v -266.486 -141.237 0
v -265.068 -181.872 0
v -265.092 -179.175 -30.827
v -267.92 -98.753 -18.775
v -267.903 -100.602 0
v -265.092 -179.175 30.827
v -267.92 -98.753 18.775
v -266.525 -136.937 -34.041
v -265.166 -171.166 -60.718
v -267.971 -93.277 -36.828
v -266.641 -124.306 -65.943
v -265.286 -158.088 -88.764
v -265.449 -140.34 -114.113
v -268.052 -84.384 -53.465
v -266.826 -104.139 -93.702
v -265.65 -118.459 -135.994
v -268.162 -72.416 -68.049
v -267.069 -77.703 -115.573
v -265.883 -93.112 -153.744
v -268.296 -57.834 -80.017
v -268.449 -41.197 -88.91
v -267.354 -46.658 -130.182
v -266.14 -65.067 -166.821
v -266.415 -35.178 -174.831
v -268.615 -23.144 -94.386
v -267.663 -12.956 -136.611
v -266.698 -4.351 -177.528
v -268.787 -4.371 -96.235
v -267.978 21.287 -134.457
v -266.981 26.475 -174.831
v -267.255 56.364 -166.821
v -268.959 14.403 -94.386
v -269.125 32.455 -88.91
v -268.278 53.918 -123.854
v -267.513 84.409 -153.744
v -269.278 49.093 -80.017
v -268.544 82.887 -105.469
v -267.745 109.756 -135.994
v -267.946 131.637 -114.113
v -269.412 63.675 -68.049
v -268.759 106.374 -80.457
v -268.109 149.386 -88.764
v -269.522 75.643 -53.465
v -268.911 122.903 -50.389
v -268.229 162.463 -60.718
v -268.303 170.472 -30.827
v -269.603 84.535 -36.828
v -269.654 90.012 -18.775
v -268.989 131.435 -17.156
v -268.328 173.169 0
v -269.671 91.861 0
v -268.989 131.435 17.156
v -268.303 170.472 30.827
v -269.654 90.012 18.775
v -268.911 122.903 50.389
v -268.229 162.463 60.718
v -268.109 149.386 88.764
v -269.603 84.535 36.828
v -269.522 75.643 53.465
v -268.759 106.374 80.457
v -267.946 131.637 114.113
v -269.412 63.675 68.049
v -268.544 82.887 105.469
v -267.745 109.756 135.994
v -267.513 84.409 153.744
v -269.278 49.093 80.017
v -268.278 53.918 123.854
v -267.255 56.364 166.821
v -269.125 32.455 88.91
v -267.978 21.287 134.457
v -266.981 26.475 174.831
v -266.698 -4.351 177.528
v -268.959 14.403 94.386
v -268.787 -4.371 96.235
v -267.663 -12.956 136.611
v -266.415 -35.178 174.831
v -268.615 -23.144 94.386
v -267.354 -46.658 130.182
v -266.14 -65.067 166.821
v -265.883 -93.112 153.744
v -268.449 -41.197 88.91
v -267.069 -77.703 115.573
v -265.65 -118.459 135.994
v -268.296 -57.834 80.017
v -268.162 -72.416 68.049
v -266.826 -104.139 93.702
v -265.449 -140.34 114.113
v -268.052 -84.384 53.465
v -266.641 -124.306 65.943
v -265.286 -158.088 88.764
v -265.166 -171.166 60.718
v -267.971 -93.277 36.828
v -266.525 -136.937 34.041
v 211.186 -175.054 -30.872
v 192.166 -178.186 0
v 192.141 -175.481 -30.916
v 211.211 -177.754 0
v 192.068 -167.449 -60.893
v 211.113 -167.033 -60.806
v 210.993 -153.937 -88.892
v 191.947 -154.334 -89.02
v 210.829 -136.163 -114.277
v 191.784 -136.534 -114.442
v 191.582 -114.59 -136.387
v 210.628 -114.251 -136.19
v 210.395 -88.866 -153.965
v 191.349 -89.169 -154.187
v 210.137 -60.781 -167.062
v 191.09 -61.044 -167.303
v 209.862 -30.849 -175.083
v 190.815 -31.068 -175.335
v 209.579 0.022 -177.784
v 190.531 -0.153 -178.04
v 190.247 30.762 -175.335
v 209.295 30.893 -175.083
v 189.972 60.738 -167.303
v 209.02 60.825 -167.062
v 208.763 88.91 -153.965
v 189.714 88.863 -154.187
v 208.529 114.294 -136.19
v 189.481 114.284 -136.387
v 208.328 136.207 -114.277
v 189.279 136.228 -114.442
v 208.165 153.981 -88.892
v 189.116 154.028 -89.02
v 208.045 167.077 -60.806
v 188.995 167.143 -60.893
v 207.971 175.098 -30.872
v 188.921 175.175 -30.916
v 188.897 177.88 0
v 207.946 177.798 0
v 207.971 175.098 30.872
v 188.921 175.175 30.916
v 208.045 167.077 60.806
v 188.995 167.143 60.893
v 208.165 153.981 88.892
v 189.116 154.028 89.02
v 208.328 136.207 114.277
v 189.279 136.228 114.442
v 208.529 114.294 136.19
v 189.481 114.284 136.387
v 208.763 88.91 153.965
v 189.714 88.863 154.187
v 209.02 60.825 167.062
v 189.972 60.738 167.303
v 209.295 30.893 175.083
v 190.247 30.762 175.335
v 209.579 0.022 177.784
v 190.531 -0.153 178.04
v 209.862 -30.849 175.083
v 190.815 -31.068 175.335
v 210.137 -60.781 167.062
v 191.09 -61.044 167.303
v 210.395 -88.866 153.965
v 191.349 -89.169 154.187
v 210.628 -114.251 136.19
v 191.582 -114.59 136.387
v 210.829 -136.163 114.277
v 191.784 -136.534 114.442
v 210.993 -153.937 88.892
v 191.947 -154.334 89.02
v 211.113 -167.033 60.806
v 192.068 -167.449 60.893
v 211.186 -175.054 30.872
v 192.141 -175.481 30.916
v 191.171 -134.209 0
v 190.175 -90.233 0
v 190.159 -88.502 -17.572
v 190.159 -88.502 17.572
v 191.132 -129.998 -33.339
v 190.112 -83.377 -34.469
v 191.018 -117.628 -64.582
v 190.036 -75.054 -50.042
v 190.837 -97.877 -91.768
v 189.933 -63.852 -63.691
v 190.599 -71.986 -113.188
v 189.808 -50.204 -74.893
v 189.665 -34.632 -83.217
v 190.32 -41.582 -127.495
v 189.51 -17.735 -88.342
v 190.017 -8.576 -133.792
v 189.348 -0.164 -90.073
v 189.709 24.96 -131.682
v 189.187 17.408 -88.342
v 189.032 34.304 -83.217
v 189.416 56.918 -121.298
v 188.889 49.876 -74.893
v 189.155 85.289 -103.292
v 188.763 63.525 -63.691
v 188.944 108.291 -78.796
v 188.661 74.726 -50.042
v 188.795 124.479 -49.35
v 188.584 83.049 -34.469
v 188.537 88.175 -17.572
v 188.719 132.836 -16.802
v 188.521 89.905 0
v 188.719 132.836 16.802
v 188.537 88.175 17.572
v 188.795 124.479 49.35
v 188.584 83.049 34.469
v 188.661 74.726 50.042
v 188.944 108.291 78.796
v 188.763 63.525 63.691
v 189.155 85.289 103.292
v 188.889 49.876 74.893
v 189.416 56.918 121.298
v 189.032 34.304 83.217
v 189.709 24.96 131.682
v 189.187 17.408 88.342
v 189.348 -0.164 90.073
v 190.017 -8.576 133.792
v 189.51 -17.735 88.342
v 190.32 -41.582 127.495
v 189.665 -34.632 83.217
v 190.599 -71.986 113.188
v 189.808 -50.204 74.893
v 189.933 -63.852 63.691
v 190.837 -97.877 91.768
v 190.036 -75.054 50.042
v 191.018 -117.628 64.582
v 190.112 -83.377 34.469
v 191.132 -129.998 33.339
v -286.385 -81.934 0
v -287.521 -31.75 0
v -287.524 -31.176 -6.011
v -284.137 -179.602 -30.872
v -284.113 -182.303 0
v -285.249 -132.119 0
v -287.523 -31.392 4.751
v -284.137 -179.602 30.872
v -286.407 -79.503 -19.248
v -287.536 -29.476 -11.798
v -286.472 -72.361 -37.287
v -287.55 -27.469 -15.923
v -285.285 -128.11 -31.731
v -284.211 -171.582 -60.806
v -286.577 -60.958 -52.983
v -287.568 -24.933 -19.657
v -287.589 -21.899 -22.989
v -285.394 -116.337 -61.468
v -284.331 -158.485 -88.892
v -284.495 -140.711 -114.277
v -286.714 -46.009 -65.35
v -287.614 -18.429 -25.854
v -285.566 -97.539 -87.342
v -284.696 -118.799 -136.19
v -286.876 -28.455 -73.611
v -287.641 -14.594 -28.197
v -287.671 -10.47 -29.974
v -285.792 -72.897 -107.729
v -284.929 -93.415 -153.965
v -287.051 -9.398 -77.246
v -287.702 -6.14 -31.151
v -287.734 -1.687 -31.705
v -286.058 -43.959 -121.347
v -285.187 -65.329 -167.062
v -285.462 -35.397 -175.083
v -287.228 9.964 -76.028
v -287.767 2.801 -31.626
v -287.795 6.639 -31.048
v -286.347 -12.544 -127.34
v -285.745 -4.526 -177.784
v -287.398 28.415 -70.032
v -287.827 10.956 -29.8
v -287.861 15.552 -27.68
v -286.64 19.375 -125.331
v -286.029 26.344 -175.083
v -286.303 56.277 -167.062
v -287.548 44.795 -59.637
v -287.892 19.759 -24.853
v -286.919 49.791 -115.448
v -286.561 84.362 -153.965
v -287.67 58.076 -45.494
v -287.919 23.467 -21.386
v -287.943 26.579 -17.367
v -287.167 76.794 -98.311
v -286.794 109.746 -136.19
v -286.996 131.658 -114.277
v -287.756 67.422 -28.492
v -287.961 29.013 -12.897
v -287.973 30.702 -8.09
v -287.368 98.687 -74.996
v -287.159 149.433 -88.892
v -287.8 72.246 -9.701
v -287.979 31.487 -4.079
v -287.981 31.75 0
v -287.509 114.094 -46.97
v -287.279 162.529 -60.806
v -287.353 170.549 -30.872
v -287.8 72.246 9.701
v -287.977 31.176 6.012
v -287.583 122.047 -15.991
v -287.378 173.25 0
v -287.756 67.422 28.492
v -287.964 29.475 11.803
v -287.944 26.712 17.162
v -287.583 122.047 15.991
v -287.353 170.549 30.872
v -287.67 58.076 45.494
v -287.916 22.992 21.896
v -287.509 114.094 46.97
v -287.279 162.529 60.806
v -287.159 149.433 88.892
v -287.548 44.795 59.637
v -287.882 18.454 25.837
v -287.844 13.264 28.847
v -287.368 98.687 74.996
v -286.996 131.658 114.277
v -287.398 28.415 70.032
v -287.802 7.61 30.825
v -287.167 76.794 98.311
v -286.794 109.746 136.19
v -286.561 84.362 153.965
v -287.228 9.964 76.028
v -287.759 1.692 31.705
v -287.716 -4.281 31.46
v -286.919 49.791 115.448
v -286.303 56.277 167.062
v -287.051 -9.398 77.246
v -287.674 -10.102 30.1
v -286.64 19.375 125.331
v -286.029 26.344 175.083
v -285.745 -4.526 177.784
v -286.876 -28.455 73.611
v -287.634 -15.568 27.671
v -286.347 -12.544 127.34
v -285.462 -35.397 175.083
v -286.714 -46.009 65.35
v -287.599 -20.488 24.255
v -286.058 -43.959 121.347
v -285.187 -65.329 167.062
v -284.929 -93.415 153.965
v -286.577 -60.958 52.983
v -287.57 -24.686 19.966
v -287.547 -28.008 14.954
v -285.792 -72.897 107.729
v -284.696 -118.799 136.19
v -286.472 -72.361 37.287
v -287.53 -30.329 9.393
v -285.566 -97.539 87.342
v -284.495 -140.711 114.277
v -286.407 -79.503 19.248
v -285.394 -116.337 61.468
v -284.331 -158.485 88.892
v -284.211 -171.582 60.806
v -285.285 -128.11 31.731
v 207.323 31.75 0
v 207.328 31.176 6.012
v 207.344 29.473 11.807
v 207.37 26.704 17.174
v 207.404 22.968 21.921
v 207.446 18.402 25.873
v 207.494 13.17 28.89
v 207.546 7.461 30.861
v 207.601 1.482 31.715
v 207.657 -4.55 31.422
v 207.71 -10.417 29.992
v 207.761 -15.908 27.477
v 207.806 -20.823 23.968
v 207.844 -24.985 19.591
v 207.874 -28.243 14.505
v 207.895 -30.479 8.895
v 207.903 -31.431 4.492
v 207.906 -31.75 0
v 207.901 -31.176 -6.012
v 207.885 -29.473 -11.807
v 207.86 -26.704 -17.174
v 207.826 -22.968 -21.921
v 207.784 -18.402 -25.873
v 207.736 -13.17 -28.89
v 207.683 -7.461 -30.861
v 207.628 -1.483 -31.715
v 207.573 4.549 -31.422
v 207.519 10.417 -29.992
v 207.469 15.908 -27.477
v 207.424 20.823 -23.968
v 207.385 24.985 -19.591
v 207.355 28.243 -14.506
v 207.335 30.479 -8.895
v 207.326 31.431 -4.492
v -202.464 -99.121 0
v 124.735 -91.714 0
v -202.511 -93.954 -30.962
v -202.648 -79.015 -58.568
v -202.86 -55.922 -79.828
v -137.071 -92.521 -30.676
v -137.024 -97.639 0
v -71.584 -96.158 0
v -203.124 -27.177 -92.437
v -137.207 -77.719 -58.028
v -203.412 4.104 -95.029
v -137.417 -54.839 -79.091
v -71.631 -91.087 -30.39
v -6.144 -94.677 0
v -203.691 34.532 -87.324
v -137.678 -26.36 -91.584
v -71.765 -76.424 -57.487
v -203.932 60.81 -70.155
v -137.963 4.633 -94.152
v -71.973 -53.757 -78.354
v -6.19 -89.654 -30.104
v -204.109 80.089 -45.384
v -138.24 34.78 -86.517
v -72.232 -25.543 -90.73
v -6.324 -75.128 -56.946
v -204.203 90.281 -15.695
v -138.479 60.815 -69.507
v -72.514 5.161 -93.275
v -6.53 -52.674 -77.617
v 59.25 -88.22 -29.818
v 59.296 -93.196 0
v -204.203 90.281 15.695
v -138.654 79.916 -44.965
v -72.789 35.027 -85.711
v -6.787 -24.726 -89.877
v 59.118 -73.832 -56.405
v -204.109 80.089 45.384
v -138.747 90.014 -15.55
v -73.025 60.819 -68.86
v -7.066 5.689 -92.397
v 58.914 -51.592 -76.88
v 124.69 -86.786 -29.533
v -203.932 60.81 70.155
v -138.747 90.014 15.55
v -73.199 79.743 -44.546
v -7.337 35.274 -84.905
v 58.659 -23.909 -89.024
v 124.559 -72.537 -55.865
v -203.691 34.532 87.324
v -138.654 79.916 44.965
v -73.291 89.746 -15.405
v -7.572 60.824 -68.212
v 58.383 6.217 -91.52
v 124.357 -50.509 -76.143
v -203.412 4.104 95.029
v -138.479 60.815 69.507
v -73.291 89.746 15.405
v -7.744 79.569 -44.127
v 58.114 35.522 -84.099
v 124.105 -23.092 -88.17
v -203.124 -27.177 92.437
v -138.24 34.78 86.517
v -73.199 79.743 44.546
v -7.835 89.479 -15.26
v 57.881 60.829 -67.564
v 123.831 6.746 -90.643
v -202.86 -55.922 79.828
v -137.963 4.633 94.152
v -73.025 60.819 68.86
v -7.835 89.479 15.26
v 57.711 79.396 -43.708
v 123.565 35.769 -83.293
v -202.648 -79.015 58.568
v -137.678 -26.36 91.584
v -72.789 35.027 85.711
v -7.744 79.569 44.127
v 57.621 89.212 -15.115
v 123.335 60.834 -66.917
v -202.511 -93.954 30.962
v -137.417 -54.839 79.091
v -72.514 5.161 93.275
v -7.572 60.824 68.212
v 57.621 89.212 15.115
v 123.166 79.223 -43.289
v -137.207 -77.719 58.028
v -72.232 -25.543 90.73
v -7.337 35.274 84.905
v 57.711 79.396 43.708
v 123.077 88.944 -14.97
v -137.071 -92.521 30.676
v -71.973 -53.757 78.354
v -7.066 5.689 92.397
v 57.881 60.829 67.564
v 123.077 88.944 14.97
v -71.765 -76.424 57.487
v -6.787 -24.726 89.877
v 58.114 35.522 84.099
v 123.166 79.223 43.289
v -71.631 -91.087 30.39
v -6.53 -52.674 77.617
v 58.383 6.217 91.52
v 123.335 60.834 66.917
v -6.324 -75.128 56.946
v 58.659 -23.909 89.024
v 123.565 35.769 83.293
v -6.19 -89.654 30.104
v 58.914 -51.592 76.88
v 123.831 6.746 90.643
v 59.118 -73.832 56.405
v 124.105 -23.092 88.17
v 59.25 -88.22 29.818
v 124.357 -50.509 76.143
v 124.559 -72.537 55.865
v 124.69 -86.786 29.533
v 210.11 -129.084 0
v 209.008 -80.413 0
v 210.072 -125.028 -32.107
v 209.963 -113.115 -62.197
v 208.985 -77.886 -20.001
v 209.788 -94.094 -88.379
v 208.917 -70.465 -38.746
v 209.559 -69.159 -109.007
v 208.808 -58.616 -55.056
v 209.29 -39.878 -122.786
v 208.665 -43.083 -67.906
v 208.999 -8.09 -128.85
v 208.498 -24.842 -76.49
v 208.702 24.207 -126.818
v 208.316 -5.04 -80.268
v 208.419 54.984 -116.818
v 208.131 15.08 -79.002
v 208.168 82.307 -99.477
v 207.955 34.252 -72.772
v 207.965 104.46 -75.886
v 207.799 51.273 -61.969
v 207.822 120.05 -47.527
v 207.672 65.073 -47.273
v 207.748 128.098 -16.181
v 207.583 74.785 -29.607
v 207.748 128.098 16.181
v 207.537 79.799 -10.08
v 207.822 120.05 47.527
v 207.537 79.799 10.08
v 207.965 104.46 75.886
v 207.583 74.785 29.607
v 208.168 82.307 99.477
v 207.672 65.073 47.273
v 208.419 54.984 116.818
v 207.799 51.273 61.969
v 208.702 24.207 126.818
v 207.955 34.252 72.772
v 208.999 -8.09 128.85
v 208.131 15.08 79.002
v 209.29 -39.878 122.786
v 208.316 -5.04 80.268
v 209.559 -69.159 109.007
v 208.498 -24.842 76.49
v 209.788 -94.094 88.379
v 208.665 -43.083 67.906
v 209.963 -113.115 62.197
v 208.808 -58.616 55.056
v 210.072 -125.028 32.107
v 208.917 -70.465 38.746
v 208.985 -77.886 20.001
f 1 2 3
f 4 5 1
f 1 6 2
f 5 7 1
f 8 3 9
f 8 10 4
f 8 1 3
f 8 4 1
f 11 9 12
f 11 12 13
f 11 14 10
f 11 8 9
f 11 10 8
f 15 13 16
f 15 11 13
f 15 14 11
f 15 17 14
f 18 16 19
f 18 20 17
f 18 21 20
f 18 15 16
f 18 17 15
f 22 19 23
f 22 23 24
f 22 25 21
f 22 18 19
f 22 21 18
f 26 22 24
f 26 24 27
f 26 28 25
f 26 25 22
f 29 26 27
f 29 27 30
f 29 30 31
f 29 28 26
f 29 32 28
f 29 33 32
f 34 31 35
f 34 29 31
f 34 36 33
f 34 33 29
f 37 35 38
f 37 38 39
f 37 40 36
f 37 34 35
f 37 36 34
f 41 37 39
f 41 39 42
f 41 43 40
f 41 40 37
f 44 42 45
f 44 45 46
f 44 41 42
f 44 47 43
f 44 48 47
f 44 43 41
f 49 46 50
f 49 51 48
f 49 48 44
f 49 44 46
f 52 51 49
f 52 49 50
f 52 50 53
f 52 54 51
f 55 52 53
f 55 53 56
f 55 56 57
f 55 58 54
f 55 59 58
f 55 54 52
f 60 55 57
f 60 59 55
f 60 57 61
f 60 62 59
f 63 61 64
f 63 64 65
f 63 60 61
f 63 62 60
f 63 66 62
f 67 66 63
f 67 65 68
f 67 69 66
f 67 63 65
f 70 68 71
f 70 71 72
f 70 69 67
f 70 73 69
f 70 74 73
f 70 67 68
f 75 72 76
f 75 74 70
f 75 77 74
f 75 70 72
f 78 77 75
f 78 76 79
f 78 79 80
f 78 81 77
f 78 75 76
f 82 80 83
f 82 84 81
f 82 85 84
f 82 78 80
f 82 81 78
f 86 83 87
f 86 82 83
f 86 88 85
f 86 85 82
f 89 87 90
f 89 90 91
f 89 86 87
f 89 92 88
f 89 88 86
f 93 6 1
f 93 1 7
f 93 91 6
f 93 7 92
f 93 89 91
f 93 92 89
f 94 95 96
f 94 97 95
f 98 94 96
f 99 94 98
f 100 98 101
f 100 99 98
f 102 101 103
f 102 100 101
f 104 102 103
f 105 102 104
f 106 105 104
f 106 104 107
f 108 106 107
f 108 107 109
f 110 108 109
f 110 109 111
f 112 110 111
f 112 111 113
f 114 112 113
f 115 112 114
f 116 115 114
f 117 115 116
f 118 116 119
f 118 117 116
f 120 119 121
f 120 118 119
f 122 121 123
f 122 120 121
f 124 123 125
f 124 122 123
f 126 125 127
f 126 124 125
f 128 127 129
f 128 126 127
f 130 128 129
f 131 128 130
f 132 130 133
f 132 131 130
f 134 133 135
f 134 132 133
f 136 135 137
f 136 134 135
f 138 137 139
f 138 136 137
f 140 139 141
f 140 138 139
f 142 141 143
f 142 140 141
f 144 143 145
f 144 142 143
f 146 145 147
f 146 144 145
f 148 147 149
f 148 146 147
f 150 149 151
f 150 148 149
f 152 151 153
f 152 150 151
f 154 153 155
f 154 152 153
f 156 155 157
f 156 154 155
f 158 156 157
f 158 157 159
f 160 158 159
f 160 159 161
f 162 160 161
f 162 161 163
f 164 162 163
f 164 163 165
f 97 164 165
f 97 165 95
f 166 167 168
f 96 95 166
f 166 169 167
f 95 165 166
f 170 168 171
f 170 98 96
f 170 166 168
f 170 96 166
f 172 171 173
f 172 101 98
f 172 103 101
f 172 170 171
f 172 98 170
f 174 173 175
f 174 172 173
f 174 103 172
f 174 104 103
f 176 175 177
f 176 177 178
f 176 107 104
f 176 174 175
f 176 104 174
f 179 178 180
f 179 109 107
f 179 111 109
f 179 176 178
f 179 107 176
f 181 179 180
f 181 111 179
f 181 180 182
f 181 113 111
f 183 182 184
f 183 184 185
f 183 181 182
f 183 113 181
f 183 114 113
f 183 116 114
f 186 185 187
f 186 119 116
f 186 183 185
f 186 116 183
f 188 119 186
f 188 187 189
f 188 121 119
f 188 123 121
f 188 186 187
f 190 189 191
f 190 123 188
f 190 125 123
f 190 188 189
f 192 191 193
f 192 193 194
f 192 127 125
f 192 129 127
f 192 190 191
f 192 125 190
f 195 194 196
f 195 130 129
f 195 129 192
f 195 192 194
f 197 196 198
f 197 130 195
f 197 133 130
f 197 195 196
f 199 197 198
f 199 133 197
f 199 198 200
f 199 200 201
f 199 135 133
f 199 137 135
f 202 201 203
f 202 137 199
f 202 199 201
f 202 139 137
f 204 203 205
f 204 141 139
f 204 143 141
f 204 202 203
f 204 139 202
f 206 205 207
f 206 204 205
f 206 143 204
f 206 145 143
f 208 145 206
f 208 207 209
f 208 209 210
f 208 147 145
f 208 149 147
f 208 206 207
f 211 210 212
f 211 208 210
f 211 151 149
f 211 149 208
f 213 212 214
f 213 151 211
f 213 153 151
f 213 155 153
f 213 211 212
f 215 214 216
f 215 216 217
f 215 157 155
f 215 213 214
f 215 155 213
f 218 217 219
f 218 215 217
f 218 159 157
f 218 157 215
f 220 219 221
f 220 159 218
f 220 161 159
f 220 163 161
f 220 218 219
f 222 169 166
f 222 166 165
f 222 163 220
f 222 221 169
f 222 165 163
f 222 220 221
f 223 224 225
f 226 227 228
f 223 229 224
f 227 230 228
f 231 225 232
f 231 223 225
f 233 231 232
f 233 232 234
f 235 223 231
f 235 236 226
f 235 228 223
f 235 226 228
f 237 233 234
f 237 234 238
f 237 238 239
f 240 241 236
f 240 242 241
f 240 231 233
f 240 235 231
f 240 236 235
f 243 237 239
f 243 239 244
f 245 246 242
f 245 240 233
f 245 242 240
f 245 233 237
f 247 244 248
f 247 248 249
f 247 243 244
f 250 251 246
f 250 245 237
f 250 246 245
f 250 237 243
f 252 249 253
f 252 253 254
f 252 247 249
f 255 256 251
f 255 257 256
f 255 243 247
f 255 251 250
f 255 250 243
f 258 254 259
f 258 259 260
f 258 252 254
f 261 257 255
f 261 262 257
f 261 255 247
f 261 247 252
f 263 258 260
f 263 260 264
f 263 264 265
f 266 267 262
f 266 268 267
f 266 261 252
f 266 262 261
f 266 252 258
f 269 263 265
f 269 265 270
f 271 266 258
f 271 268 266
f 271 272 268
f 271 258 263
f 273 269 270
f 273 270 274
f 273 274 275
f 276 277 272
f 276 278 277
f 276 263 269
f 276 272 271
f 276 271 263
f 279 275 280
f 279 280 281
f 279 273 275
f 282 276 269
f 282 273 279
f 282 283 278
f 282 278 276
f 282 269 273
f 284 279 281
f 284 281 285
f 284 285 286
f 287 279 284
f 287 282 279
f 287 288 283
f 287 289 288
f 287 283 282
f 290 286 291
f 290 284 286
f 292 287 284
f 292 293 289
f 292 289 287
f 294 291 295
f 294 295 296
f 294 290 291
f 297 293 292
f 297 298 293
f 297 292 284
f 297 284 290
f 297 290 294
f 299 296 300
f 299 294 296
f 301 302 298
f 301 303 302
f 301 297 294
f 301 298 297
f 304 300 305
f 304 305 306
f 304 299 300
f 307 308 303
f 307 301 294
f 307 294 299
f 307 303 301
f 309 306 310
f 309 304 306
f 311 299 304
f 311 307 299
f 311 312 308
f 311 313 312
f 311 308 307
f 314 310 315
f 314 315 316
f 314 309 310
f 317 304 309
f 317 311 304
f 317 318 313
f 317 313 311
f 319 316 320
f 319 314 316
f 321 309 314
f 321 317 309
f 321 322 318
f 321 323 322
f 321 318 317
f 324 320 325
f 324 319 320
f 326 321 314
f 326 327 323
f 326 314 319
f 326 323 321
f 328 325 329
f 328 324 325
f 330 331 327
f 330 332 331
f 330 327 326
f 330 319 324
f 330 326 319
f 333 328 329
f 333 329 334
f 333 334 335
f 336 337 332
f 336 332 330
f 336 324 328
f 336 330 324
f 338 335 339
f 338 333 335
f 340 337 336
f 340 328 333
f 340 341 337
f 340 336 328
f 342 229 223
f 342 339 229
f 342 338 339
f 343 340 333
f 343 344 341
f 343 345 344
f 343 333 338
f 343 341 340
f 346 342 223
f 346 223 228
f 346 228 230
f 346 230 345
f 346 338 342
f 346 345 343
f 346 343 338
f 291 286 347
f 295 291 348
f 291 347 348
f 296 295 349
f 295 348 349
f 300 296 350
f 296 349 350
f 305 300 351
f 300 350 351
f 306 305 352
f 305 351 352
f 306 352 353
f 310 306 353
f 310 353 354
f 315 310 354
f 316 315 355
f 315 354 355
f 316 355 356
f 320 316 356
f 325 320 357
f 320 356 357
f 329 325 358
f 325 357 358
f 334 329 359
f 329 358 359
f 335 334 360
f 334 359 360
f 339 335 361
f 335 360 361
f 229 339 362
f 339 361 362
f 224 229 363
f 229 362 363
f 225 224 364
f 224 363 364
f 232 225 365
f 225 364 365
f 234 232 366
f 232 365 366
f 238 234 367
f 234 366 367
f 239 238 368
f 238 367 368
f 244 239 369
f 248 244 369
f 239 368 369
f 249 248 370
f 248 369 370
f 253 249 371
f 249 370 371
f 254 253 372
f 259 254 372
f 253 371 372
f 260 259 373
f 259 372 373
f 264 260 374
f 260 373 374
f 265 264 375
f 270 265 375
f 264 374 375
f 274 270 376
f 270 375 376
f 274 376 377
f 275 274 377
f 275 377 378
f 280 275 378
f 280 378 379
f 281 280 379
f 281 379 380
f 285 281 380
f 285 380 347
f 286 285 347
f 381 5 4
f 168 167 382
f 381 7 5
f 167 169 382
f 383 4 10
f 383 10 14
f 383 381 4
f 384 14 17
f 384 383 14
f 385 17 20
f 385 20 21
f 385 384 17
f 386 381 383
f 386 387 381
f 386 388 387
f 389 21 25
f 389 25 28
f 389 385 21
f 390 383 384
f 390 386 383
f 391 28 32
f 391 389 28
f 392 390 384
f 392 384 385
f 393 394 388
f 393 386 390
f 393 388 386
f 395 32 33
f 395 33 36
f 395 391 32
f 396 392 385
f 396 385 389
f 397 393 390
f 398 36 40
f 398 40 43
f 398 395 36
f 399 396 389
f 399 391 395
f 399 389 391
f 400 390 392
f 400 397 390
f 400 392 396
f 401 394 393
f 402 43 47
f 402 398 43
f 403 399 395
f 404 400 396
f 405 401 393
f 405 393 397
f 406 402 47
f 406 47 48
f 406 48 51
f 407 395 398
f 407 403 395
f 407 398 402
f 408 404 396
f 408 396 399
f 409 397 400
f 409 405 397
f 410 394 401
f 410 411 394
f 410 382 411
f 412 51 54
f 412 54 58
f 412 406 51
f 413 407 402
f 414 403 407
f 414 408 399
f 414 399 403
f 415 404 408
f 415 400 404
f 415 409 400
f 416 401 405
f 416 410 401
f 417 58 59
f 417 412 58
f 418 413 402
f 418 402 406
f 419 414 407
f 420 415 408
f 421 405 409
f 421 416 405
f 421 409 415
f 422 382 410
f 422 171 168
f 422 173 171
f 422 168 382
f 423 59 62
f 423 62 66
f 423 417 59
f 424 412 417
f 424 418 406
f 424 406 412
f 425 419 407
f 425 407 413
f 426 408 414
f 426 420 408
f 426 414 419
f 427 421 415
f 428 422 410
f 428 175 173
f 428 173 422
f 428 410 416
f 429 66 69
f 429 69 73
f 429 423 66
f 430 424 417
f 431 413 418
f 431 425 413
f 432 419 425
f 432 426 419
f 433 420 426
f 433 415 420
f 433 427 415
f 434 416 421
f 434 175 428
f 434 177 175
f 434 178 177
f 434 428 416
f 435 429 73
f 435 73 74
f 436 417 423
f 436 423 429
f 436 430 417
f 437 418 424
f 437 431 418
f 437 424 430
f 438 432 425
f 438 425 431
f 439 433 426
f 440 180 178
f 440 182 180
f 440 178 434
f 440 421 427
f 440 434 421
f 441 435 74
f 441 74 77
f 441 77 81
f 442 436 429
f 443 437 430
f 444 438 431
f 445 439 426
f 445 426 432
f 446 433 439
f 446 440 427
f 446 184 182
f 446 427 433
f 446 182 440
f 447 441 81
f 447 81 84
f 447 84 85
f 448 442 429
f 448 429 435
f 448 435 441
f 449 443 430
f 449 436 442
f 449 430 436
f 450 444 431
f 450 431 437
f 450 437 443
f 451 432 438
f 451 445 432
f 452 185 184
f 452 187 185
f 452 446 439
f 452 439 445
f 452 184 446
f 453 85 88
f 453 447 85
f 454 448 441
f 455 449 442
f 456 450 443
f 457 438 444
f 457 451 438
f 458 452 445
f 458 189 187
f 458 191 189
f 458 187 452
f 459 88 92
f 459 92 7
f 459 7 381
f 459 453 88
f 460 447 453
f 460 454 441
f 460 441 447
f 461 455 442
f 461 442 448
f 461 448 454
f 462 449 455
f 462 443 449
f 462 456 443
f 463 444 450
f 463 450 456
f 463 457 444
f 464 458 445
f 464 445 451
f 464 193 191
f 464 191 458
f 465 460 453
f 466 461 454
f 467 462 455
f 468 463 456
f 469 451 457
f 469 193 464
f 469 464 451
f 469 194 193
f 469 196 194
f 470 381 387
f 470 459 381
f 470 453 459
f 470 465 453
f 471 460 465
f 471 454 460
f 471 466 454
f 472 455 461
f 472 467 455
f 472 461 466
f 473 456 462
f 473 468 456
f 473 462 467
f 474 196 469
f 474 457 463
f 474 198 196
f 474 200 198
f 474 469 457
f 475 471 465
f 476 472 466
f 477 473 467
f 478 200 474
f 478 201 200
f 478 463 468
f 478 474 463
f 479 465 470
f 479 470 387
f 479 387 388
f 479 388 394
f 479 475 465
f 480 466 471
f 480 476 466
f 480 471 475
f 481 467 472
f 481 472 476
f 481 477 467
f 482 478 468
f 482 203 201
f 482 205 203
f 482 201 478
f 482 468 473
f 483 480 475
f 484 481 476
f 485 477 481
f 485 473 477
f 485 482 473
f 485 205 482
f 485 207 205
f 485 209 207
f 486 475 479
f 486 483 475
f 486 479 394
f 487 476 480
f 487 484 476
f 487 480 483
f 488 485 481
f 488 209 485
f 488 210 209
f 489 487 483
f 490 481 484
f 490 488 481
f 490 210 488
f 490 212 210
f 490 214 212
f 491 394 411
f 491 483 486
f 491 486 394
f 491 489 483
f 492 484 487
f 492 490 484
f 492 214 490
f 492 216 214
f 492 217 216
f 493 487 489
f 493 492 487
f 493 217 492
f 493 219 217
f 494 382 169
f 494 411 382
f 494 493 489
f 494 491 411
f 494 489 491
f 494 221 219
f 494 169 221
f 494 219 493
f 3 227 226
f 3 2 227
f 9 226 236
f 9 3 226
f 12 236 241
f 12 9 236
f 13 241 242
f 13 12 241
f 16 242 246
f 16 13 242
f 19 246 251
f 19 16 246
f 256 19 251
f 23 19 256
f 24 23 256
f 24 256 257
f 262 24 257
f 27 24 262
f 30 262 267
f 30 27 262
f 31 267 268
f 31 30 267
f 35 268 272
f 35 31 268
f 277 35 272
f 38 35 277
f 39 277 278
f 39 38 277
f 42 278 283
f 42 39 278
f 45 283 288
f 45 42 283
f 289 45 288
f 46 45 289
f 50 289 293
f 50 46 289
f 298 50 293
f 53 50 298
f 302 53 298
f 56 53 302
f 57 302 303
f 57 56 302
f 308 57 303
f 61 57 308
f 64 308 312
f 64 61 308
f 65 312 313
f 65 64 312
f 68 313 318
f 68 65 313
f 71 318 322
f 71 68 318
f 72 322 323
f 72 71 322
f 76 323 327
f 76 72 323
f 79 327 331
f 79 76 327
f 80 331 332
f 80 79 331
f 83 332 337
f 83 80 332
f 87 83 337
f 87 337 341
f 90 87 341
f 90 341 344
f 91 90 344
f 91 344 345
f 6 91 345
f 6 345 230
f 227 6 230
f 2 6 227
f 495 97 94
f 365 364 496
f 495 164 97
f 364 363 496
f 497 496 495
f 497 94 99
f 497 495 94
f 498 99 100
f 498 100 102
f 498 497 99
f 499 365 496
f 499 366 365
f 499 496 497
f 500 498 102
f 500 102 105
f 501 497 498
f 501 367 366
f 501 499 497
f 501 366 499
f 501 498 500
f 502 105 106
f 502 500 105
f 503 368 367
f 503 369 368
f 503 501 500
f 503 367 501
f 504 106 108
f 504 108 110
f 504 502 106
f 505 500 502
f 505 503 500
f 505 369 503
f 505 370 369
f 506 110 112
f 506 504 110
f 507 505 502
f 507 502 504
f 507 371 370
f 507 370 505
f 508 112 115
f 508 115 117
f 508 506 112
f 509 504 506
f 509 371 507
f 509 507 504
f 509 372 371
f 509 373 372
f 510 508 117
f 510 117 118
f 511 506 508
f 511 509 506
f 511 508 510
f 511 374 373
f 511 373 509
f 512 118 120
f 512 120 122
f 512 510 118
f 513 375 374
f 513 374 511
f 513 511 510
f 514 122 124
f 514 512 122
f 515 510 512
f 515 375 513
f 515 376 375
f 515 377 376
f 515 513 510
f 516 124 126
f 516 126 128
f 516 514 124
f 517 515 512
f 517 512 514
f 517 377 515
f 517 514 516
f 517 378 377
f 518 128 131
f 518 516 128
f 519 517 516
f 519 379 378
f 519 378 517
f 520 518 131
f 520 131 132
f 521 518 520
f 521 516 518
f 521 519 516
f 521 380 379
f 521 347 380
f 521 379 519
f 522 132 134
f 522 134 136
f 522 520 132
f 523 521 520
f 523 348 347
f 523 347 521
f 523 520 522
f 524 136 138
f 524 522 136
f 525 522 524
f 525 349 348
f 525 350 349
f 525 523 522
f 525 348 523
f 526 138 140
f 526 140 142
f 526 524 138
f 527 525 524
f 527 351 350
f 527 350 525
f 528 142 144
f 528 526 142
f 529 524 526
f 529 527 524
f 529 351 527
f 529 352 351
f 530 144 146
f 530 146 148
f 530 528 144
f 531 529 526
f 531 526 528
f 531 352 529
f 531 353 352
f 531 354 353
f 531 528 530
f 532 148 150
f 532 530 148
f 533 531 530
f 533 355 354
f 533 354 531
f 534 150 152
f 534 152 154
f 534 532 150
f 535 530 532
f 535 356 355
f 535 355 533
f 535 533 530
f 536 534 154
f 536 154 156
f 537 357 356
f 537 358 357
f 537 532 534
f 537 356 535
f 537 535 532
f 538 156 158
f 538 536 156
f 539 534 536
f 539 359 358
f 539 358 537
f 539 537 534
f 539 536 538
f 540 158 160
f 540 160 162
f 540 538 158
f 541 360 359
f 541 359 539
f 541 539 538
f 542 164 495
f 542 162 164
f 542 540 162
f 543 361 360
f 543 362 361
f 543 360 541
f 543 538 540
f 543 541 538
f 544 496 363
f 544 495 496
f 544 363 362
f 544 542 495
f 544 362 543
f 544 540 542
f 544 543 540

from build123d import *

# Parameters (mm, degrees)
F2_R          = 31.75
F3_DEPTH      = 211.2122471454
F3_DEPTH_BACK = 288.1372322342


with BuildPart() as f1:
    # F0 (on Top) → F1 (revolve)
    with BuildSketch(Plane.XY):
        Polygon((207.1876852567, 0), (-288.1362322342, -4.5483284574), (-284.1126703454, -182.3027966142), (-265.0675487572, -181.8717006976), (-267.9034604739, -100.6019149123), (190.1752766148, -90.2330720489), (192.1661255572, -178.1855640735), (211.2112471454, -177.7544681569), align=None)
    revolve(axis=Axis((-40.4742734887, -2.2741642287, 0), (0.9999578432, 0.0091821464, 0)))

    # F2 (on Right) → F3 (cut, two sides)
    with BuildSketch(Plane.YZ) as f3_sk:
        Circle(F2_R)
    extrude(amount=F3_DEPTH, mode=Mode.SUBTRACT)
    extrude(f3_sk.sketch, amount=-F3_DEPTH_BACK, mode=Mode.SUBTRACT)


solid = f1.part
